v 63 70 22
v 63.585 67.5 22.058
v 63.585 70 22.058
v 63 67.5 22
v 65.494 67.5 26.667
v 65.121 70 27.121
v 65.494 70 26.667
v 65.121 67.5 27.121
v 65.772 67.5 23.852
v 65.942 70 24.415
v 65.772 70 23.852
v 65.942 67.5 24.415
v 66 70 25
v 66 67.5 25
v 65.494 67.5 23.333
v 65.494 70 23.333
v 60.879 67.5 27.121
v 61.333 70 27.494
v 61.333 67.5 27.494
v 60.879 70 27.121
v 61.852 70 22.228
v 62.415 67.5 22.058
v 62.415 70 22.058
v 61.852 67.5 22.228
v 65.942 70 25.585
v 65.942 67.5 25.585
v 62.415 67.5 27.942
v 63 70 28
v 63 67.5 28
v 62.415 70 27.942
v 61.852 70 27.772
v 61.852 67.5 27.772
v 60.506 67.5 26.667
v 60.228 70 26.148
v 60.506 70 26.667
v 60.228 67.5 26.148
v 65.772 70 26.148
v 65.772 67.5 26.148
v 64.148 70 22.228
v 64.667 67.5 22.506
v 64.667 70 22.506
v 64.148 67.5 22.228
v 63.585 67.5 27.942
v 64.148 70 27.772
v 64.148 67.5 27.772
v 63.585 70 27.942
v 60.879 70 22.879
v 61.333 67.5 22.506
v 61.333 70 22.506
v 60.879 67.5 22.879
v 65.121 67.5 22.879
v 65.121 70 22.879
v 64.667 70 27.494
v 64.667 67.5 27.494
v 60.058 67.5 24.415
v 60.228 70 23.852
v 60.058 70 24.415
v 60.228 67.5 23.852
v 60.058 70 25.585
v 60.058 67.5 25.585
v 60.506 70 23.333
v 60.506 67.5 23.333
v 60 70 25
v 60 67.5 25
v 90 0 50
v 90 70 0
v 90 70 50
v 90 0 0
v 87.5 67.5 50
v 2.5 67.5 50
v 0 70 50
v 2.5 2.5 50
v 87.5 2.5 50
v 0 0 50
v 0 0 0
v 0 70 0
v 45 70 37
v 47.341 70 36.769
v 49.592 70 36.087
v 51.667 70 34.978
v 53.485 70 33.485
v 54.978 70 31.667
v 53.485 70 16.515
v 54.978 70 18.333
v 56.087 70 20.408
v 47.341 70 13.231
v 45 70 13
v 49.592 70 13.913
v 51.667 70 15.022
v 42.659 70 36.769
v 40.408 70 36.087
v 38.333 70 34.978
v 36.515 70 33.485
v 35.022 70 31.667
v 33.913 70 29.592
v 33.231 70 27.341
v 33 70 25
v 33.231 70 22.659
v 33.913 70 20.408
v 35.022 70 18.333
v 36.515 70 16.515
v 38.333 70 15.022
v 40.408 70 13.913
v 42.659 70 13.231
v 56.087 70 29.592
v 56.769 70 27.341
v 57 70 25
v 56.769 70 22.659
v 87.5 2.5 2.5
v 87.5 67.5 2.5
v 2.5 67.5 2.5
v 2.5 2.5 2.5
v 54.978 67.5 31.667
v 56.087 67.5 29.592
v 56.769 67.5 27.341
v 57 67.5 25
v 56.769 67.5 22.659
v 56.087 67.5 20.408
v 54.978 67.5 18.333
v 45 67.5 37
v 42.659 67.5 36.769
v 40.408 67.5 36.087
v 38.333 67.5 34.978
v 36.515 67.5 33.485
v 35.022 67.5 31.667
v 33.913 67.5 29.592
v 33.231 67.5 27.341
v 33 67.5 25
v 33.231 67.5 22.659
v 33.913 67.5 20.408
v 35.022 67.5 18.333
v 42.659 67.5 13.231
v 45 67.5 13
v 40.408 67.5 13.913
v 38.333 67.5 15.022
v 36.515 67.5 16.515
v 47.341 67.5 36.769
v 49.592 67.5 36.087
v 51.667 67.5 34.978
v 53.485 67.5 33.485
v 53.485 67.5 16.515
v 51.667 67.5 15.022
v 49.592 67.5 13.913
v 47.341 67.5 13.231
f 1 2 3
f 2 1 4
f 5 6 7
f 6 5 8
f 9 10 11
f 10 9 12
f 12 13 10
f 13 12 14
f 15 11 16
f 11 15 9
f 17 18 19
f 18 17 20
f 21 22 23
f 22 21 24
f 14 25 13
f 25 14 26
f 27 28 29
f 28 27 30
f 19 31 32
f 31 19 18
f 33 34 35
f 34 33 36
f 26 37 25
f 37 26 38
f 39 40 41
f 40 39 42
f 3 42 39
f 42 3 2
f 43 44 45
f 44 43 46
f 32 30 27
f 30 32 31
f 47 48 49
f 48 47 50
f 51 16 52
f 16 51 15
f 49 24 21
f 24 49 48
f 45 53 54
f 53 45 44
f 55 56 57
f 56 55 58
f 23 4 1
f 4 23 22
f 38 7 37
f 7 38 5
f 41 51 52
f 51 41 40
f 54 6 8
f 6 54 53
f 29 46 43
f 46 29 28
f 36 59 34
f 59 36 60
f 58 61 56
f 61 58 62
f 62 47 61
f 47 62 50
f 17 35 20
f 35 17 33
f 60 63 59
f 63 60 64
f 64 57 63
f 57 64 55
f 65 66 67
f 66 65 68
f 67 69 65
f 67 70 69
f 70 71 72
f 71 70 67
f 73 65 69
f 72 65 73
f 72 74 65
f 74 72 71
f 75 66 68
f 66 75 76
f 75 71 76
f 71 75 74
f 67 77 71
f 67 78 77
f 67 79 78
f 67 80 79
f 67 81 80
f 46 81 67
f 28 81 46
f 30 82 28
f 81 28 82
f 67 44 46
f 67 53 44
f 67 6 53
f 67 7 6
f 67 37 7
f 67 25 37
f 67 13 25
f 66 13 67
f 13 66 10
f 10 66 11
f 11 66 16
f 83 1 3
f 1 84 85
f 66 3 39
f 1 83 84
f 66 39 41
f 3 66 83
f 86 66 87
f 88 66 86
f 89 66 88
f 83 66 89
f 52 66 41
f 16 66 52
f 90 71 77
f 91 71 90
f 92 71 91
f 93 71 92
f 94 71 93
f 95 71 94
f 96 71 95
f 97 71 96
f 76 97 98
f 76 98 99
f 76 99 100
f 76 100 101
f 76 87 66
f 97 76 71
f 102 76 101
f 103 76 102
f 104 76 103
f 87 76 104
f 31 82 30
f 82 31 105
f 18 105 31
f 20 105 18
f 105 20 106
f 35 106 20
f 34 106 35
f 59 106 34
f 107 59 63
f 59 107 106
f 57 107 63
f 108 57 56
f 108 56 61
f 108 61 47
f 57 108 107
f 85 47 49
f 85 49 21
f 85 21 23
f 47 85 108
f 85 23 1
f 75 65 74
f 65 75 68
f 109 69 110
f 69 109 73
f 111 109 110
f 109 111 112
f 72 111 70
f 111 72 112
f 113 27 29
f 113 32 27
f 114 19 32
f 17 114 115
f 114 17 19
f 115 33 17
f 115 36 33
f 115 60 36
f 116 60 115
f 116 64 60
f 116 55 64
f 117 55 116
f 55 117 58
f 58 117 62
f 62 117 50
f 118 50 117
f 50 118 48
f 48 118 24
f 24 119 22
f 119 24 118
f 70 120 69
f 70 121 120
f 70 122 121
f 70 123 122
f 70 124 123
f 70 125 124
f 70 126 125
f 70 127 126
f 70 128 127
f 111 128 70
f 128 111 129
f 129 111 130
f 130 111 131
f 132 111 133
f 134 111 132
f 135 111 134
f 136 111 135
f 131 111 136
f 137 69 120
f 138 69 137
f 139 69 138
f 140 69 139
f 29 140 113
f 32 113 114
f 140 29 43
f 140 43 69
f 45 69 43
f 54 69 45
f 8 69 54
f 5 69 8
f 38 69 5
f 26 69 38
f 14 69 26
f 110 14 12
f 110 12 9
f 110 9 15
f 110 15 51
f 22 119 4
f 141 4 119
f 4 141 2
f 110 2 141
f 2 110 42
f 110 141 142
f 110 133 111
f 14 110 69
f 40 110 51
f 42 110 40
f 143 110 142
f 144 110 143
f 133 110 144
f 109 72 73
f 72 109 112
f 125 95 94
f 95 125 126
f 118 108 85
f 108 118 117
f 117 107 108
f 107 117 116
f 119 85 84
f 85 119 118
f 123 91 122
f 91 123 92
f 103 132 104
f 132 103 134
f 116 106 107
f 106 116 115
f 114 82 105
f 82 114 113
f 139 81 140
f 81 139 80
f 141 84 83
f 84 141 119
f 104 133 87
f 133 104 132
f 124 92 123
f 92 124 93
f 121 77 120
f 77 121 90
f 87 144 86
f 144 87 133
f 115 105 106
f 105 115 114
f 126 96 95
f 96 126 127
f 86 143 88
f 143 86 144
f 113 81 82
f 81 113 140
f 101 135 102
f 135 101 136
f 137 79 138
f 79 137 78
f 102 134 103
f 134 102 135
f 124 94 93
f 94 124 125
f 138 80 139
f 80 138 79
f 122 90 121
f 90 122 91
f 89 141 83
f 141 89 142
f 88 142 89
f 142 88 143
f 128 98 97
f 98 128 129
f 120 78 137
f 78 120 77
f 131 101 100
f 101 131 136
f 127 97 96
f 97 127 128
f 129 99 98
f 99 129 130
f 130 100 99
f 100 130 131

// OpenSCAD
$fn = 32;

// ----------------------------------------------------------------------
// Vent box: roundvent enclosure
// ----------------------------------------------------------------------

// --- parameters (mm) ---
box_l = 90;               // box length, X
box_w = 70;               // box width, Y
box_h = 50;               // box height, Z
wall_t = 2.5;             // shell wall thickness
vent_d = 24;              // central vent diameter
ring_d = 6;               // ring hole diameter
n_ring = 8;               // holes in the ring
ring_r = 18;              // ring radius

ring_step = 360 / n_ring;  // ring hole angular step

difference() {
  cube([box_l, box_w, box_h]);
  translate([wall_t, wall_t, wall_t])
    cube([box_l - 2 * wall_t, box_w - 2 * wall_t, box_h]);
  translate([box_l / 2, box_w - wall_t - 1, box_h / 2])
    rotate([-90, 0, 0]) cylinder(h = wall_t + 2, d = vent_d);
  for (i = [0 : n_ring - 1])
    translate([box_l / 2, box_w - wall_t - 1, box_h / 2])
      rotate([0, 0, i * ring_step])
        translate([ring_r, 0, 0]) rotate([-90, 0, 0])
          cylinder(h = wall_t + 2, d = ring_d);
}
